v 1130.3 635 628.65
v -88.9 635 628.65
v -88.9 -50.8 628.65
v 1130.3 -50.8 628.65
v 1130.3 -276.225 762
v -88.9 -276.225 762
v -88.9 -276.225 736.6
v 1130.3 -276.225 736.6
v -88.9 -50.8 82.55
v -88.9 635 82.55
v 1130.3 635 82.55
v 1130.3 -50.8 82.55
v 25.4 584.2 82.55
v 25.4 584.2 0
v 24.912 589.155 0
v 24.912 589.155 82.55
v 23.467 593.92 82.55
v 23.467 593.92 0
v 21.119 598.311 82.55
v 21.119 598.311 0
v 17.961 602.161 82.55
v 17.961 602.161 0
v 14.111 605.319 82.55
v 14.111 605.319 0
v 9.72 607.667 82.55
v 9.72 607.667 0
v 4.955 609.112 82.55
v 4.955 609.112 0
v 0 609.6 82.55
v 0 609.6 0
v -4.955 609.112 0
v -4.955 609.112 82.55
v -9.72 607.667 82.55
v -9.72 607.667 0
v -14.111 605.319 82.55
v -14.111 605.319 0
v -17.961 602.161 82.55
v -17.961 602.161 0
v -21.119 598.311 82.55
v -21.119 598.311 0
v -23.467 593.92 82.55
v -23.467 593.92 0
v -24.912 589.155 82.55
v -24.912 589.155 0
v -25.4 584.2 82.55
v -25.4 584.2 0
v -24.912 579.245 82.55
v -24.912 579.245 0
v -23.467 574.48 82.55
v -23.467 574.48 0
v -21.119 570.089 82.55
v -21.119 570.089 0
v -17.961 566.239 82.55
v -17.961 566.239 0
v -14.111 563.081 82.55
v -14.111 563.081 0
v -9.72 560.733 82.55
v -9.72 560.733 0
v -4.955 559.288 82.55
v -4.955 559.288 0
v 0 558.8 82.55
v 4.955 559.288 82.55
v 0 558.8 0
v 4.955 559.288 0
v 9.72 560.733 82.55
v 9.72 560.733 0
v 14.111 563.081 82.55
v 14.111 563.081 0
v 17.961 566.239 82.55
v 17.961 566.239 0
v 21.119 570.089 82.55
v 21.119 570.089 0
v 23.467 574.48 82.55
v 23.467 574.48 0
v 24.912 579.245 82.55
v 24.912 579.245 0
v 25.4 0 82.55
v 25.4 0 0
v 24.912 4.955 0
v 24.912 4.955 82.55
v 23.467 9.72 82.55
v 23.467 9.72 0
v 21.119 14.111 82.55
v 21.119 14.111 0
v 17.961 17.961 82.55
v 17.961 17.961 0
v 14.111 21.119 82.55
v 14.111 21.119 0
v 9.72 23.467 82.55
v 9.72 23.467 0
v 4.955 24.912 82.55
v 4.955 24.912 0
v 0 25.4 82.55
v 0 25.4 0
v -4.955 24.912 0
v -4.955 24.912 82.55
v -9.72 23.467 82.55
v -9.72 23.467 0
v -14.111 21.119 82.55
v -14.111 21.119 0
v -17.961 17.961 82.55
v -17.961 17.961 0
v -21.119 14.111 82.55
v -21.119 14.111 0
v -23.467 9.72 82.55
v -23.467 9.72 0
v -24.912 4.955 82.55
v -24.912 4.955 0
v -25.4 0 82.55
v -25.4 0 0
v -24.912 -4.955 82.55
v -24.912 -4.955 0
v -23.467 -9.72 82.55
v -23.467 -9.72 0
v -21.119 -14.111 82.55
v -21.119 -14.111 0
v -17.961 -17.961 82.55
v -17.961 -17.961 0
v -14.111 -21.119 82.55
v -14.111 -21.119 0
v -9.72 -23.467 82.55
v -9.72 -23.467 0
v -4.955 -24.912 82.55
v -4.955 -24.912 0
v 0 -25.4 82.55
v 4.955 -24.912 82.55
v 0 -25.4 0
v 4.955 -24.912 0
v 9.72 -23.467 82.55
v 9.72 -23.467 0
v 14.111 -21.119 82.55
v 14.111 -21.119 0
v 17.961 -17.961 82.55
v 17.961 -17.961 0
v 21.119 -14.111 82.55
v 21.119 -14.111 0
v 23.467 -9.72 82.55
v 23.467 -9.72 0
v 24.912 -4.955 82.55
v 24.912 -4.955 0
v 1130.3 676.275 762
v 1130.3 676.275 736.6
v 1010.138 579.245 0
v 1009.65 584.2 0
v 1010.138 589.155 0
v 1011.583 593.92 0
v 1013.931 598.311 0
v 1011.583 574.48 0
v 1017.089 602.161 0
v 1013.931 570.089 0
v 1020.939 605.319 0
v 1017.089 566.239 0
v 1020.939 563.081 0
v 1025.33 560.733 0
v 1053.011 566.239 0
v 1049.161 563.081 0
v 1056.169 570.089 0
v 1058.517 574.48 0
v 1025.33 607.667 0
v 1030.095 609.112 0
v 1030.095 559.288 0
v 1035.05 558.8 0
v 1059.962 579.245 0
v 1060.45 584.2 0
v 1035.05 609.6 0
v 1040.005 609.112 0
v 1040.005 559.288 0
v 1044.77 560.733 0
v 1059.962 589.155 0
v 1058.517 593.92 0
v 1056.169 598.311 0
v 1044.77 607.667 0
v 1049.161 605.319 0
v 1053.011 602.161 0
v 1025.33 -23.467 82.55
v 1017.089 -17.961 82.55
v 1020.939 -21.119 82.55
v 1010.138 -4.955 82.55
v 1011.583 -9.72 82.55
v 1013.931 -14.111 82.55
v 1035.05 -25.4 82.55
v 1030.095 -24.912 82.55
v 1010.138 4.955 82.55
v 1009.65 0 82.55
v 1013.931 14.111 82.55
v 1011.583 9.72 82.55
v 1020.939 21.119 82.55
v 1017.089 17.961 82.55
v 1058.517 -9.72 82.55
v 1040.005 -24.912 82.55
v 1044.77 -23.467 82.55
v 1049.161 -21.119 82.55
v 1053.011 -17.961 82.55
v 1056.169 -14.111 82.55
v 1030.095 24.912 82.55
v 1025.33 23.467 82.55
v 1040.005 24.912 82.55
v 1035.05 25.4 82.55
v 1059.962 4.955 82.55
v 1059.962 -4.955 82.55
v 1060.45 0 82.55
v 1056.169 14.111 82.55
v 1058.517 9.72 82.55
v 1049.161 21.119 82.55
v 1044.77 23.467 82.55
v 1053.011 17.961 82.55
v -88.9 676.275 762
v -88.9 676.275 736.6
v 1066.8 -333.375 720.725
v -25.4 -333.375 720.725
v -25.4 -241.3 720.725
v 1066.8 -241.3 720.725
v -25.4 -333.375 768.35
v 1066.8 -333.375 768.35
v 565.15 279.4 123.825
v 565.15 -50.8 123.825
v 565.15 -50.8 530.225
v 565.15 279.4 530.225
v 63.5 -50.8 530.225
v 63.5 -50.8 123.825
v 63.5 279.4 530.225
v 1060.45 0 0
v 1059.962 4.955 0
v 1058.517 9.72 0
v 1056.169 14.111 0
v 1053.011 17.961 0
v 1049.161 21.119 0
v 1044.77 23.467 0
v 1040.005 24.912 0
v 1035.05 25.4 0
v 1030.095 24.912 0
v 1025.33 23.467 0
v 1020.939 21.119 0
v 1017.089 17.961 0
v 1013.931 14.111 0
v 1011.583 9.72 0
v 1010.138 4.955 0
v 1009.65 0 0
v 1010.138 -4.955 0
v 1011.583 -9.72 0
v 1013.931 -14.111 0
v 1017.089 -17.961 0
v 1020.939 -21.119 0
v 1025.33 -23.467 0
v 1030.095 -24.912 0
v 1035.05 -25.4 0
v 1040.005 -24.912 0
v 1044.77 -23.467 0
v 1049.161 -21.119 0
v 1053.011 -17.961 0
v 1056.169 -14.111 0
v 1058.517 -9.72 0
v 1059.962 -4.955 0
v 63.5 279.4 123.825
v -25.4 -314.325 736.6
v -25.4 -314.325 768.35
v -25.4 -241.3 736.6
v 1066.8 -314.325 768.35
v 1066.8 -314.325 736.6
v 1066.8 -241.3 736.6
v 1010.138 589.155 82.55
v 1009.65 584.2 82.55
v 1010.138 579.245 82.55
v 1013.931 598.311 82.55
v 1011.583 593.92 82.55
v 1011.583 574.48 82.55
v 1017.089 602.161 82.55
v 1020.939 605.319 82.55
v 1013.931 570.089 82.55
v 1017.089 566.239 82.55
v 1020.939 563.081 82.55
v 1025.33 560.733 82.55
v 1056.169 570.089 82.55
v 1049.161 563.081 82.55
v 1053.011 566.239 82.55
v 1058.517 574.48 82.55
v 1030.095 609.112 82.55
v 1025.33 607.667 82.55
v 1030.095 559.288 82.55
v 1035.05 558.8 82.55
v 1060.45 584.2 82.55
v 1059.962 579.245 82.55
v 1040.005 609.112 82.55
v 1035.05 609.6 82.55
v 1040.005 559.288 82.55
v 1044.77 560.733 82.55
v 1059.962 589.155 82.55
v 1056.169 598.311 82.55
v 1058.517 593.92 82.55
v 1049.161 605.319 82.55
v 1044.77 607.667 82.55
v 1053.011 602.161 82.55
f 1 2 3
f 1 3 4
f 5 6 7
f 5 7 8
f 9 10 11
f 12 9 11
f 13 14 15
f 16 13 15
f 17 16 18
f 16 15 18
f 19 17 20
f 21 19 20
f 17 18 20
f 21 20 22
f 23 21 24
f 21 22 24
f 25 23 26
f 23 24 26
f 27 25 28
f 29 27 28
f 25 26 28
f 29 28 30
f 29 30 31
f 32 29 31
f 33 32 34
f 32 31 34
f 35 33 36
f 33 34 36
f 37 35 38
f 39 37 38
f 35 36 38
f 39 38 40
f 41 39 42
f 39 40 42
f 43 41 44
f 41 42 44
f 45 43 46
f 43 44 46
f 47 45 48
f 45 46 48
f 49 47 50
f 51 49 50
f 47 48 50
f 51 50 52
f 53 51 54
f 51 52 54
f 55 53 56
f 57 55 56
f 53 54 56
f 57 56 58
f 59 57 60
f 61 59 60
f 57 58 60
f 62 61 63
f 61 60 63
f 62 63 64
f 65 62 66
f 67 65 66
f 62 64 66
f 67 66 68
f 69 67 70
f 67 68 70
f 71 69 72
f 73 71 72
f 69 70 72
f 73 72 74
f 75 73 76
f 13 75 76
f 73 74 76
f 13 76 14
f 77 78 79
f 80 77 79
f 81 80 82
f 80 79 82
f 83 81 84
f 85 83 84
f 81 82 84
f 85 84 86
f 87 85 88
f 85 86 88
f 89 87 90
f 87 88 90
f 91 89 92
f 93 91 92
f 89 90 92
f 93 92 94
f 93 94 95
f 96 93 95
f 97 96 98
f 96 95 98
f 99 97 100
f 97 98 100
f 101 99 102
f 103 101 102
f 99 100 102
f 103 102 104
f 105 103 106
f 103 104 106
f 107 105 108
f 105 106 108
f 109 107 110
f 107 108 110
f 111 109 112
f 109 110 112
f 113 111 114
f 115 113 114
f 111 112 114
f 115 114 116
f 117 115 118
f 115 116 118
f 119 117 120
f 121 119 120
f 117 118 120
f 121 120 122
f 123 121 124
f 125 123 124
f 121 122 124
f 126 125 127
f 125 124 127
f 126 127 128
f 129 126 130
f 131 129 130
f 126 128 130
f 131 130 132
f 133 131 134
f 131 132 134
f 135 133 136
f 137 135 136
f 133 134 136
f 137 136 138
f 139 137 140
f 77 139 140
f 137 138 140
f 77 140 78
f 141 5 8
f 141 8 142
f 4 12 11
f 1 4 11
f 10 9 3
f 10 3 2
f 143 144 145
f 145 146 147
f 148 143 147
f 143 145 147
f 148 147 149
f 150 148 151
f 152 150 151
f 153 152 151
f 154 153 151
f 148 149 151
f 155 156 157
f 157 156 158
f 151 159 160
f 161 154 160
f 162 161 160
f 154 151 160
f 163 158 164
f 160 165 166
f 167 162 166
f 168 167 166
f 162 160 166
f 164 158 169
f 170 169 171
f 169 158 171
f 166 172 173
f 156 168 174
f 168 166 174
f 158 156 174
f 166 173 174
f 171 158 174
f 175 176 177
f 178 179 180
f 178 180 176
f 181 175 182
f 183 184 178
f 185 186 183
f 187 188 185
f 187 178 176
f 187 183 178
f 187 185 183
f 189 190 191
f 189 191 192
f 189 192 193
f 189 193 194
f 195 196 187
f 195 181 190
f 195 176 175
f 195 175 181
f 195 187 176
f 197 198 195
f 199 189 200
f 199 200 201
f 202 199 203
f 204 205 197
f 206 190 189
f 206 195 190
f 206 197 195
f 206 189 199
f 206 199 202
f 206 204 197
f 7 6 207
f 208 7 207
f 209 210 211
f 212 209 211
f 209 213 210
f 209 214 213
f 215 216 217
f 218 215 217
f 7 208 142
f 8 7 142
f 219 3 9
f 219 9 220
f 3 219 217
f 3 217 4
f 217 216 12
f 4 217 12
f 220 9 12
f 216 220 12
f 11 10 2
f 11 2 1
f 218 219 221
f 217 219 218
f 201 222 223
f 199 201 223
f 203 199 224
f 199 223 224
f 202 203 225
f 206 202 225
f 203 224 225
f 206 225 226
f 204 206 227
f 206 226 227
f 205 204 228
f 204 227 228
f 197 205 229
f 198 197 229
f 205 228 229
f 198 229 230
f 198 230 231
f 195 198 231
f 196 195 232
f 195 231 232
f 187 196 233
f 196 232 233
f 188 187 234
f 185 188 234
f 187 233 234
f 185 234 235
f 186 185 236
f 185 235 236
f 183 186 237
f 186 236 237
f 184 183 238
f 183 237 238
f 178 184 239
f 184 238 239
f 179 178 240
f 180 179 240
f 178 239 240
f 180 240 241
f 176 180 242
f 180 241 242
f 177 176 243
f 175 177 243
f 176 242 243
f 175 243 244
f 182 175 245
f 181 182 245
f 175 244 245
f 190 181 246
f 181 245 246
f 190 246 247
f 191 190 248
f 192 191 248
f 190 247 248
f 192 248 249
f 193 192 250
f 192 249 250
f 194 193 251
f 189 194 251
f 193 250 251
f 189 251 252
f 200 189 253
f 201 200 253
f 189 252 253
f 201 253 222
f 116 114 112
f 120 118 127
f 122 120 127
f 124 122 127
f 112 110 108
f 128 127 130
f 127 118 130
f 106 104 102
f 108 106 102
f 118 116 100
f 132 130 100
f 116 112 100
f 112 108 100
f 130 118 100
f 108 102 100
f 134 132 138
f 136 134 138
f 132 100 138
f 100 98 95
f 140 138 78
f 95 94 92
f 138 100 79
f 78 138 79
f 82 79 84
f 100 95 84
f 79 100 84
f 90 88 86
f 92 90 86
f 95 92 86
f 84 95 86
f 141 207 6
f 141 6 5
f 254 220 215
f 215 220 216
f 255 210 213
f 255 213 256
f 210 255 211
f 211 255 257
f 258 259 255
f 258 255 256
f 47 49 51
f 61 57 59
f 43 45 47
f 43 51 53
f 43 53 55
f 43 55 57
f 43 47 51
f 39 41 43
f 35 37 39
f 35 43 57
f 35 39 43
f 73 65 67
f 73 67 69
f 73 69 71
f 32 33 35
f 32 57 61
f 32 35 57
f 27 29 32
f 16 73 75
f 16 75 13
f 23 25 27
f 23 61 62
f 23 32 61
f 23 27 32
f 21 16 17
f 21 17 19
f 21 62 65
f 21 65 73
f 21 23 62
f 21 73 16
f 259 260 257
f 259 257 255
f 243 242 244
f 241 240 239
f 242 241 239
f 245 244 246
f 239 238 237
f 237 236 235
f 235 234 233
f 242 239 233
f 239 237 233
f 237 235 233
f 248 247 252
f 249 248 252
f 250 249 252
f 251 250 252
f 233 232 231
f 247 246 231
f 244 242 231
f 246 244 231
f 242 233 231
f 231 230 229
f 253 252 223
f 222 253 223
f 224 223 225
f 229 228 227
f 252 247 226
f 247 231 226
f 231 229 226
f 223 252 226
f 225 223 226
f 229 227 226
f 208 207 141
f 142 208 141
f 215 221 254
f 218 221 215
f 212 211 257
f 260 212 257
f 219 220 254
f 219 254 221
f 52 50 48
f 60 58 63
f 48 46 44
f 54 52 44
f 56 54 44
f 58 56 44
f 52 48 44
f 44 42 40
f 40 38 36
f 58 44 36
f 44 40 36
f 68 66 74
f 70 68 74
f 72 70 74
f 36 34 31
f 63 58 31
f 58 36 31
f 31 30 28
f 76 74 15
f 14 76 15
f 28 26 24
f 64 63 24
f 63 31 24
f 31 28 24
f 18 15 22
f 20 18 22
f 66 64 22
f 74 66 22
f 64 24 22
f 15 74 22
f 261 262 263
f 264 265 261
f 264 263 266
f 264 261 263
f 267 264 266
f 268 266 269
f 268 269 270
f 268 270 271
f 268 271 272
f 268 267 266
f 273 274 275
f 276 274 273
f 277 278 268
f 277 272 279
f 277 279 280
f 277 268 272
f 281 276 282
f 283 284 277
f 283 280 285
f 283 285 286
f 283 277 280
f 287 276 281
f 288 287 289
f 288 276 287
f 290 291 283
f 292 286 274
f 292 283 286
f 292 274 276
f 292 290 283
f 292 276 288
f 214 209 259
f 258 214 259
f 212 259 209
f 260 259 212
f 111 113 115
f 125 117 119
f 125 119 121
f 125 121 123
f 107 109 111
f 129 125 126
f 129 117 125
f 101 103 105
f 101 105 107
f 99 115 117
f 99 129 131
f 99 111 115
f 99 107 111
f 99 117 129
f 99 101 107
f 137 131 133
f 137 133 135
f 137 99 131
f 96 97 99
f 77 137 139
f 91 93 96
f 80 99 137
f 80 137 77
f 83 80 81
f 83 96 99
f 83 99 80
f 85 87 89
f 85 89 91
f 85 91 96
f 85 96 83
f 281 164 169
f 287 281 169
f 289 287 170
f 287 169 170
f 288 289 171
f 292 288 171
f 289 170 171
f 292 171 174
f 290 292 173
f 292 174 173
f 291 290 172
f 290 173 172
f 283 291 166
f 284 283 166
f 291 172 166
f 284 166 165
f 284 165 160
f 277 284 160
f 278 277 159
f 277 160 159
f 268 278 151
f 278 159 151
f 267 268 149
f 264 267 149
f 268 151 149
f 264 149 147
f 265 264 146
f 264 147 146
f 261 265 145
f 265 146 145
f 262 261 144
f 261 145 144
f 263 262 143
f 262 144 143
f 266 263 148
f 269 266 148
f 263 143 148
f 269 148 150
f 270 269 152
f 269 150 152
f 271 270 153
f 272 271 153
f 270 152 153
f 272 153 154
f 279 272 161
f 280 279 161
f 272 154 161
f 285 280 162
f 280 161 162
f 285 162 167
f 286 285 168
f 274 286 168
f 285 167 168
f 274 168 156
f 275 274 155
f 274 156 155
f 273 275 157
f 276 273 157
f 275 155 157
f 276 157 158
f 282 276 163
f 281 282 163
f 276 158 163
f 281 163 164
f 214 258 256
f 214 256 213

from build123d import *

# Parameters (mm, degrees)
F0_R      = 25.4
F1_DEPTH  = 82.55
F2_W      = 1219.2
F2_H      = 685.8
F3_DEPTH  = 546.1
F4_W      = 501.65
F4_H      = 406.4
F5_DEPTH  = 330.2
F7_W      = 1219.2
F7_H      = 952.5
F8_DEPTH  = 25.4
F11_DEPTH = 546.1


with BuildPart() as f1:
    # F0 (on Top) → F1 (new body)
    with BuildSketch(Plane.XY):
        with Locations((1035.05, 0)):
            Circle(F0_R)
    extrude(amount=F1_DEPTH)


with BuildPart() as f1b:
    # F0 (on Top) → F1, piece 2 (new body)
    with BuildSketch(Plane.XY):
        Circle(F0_R)
    extrude(amount=F1_DEPTH)


with BuildPart() as f1c:
    # F0 (on Top) → F1, piece 3 (new body)
    with BuildSketch(Plane.XY):
        with Locations((1035.05, 584.2)):
            Circle(F0_R)
    extrude(amount=F1_DEPTH)


with BuildPart() as f1d:
    # F0 (on Top) → F1, piece 4 (new body)
    with BuildSketch(Plane.XY):
        with Locations((0, 584.2)):
            Circle(F0_R)
    extrude(amount=F1_DEPTH)


with BuildPart() as f3:
    # F2 (on face) → F3 (new body)
    with BuildSketch(Plane.XY.offset(82.55)):
        with Locations((520.7, 292.1)):
            Rectangle(F2_W, F2_H)
    extrude(amount=F3_DEPTH)

    # F4 (on face) → F5 (cut)
    with BuildSketch(Plane.XZ.offset(50.8)):
        with Locations((314.325, 327.025)):
            Rectangle(F4_W, F4_H)
    extrude(amount=-F5_DEPTH, mode=Mode.SUBTRACT)


with BuildPart() as f8:
    # F7 (on offset) → F8 (new body)
    with BuildSketch(Plane.XY.offset(762)):
        with Locations((520.7, 200.025)):
            Rectangle(F7_W, F7_H)
    extrude(amount=-F8_DEPTH)


with BuildPart() as f11:
    # F10 (on mid) → F11 (new body, symmetric)
    with BuildSketch(Plane.YZ.offset(520.7)):
        Polygon((-241.3, 720.725), (-241.3, 736.6), (-314.325, 736.6), (-314.325, 768.35), (-333.375, 768.35), (-333.375, 720.725), align=None)
    extrude(amount=F11_DEPTH, both=True)


solid = Compound([f1.part, f1b.part, f1c.part, f1d.part, f3.part, f8.part, f11.part])
